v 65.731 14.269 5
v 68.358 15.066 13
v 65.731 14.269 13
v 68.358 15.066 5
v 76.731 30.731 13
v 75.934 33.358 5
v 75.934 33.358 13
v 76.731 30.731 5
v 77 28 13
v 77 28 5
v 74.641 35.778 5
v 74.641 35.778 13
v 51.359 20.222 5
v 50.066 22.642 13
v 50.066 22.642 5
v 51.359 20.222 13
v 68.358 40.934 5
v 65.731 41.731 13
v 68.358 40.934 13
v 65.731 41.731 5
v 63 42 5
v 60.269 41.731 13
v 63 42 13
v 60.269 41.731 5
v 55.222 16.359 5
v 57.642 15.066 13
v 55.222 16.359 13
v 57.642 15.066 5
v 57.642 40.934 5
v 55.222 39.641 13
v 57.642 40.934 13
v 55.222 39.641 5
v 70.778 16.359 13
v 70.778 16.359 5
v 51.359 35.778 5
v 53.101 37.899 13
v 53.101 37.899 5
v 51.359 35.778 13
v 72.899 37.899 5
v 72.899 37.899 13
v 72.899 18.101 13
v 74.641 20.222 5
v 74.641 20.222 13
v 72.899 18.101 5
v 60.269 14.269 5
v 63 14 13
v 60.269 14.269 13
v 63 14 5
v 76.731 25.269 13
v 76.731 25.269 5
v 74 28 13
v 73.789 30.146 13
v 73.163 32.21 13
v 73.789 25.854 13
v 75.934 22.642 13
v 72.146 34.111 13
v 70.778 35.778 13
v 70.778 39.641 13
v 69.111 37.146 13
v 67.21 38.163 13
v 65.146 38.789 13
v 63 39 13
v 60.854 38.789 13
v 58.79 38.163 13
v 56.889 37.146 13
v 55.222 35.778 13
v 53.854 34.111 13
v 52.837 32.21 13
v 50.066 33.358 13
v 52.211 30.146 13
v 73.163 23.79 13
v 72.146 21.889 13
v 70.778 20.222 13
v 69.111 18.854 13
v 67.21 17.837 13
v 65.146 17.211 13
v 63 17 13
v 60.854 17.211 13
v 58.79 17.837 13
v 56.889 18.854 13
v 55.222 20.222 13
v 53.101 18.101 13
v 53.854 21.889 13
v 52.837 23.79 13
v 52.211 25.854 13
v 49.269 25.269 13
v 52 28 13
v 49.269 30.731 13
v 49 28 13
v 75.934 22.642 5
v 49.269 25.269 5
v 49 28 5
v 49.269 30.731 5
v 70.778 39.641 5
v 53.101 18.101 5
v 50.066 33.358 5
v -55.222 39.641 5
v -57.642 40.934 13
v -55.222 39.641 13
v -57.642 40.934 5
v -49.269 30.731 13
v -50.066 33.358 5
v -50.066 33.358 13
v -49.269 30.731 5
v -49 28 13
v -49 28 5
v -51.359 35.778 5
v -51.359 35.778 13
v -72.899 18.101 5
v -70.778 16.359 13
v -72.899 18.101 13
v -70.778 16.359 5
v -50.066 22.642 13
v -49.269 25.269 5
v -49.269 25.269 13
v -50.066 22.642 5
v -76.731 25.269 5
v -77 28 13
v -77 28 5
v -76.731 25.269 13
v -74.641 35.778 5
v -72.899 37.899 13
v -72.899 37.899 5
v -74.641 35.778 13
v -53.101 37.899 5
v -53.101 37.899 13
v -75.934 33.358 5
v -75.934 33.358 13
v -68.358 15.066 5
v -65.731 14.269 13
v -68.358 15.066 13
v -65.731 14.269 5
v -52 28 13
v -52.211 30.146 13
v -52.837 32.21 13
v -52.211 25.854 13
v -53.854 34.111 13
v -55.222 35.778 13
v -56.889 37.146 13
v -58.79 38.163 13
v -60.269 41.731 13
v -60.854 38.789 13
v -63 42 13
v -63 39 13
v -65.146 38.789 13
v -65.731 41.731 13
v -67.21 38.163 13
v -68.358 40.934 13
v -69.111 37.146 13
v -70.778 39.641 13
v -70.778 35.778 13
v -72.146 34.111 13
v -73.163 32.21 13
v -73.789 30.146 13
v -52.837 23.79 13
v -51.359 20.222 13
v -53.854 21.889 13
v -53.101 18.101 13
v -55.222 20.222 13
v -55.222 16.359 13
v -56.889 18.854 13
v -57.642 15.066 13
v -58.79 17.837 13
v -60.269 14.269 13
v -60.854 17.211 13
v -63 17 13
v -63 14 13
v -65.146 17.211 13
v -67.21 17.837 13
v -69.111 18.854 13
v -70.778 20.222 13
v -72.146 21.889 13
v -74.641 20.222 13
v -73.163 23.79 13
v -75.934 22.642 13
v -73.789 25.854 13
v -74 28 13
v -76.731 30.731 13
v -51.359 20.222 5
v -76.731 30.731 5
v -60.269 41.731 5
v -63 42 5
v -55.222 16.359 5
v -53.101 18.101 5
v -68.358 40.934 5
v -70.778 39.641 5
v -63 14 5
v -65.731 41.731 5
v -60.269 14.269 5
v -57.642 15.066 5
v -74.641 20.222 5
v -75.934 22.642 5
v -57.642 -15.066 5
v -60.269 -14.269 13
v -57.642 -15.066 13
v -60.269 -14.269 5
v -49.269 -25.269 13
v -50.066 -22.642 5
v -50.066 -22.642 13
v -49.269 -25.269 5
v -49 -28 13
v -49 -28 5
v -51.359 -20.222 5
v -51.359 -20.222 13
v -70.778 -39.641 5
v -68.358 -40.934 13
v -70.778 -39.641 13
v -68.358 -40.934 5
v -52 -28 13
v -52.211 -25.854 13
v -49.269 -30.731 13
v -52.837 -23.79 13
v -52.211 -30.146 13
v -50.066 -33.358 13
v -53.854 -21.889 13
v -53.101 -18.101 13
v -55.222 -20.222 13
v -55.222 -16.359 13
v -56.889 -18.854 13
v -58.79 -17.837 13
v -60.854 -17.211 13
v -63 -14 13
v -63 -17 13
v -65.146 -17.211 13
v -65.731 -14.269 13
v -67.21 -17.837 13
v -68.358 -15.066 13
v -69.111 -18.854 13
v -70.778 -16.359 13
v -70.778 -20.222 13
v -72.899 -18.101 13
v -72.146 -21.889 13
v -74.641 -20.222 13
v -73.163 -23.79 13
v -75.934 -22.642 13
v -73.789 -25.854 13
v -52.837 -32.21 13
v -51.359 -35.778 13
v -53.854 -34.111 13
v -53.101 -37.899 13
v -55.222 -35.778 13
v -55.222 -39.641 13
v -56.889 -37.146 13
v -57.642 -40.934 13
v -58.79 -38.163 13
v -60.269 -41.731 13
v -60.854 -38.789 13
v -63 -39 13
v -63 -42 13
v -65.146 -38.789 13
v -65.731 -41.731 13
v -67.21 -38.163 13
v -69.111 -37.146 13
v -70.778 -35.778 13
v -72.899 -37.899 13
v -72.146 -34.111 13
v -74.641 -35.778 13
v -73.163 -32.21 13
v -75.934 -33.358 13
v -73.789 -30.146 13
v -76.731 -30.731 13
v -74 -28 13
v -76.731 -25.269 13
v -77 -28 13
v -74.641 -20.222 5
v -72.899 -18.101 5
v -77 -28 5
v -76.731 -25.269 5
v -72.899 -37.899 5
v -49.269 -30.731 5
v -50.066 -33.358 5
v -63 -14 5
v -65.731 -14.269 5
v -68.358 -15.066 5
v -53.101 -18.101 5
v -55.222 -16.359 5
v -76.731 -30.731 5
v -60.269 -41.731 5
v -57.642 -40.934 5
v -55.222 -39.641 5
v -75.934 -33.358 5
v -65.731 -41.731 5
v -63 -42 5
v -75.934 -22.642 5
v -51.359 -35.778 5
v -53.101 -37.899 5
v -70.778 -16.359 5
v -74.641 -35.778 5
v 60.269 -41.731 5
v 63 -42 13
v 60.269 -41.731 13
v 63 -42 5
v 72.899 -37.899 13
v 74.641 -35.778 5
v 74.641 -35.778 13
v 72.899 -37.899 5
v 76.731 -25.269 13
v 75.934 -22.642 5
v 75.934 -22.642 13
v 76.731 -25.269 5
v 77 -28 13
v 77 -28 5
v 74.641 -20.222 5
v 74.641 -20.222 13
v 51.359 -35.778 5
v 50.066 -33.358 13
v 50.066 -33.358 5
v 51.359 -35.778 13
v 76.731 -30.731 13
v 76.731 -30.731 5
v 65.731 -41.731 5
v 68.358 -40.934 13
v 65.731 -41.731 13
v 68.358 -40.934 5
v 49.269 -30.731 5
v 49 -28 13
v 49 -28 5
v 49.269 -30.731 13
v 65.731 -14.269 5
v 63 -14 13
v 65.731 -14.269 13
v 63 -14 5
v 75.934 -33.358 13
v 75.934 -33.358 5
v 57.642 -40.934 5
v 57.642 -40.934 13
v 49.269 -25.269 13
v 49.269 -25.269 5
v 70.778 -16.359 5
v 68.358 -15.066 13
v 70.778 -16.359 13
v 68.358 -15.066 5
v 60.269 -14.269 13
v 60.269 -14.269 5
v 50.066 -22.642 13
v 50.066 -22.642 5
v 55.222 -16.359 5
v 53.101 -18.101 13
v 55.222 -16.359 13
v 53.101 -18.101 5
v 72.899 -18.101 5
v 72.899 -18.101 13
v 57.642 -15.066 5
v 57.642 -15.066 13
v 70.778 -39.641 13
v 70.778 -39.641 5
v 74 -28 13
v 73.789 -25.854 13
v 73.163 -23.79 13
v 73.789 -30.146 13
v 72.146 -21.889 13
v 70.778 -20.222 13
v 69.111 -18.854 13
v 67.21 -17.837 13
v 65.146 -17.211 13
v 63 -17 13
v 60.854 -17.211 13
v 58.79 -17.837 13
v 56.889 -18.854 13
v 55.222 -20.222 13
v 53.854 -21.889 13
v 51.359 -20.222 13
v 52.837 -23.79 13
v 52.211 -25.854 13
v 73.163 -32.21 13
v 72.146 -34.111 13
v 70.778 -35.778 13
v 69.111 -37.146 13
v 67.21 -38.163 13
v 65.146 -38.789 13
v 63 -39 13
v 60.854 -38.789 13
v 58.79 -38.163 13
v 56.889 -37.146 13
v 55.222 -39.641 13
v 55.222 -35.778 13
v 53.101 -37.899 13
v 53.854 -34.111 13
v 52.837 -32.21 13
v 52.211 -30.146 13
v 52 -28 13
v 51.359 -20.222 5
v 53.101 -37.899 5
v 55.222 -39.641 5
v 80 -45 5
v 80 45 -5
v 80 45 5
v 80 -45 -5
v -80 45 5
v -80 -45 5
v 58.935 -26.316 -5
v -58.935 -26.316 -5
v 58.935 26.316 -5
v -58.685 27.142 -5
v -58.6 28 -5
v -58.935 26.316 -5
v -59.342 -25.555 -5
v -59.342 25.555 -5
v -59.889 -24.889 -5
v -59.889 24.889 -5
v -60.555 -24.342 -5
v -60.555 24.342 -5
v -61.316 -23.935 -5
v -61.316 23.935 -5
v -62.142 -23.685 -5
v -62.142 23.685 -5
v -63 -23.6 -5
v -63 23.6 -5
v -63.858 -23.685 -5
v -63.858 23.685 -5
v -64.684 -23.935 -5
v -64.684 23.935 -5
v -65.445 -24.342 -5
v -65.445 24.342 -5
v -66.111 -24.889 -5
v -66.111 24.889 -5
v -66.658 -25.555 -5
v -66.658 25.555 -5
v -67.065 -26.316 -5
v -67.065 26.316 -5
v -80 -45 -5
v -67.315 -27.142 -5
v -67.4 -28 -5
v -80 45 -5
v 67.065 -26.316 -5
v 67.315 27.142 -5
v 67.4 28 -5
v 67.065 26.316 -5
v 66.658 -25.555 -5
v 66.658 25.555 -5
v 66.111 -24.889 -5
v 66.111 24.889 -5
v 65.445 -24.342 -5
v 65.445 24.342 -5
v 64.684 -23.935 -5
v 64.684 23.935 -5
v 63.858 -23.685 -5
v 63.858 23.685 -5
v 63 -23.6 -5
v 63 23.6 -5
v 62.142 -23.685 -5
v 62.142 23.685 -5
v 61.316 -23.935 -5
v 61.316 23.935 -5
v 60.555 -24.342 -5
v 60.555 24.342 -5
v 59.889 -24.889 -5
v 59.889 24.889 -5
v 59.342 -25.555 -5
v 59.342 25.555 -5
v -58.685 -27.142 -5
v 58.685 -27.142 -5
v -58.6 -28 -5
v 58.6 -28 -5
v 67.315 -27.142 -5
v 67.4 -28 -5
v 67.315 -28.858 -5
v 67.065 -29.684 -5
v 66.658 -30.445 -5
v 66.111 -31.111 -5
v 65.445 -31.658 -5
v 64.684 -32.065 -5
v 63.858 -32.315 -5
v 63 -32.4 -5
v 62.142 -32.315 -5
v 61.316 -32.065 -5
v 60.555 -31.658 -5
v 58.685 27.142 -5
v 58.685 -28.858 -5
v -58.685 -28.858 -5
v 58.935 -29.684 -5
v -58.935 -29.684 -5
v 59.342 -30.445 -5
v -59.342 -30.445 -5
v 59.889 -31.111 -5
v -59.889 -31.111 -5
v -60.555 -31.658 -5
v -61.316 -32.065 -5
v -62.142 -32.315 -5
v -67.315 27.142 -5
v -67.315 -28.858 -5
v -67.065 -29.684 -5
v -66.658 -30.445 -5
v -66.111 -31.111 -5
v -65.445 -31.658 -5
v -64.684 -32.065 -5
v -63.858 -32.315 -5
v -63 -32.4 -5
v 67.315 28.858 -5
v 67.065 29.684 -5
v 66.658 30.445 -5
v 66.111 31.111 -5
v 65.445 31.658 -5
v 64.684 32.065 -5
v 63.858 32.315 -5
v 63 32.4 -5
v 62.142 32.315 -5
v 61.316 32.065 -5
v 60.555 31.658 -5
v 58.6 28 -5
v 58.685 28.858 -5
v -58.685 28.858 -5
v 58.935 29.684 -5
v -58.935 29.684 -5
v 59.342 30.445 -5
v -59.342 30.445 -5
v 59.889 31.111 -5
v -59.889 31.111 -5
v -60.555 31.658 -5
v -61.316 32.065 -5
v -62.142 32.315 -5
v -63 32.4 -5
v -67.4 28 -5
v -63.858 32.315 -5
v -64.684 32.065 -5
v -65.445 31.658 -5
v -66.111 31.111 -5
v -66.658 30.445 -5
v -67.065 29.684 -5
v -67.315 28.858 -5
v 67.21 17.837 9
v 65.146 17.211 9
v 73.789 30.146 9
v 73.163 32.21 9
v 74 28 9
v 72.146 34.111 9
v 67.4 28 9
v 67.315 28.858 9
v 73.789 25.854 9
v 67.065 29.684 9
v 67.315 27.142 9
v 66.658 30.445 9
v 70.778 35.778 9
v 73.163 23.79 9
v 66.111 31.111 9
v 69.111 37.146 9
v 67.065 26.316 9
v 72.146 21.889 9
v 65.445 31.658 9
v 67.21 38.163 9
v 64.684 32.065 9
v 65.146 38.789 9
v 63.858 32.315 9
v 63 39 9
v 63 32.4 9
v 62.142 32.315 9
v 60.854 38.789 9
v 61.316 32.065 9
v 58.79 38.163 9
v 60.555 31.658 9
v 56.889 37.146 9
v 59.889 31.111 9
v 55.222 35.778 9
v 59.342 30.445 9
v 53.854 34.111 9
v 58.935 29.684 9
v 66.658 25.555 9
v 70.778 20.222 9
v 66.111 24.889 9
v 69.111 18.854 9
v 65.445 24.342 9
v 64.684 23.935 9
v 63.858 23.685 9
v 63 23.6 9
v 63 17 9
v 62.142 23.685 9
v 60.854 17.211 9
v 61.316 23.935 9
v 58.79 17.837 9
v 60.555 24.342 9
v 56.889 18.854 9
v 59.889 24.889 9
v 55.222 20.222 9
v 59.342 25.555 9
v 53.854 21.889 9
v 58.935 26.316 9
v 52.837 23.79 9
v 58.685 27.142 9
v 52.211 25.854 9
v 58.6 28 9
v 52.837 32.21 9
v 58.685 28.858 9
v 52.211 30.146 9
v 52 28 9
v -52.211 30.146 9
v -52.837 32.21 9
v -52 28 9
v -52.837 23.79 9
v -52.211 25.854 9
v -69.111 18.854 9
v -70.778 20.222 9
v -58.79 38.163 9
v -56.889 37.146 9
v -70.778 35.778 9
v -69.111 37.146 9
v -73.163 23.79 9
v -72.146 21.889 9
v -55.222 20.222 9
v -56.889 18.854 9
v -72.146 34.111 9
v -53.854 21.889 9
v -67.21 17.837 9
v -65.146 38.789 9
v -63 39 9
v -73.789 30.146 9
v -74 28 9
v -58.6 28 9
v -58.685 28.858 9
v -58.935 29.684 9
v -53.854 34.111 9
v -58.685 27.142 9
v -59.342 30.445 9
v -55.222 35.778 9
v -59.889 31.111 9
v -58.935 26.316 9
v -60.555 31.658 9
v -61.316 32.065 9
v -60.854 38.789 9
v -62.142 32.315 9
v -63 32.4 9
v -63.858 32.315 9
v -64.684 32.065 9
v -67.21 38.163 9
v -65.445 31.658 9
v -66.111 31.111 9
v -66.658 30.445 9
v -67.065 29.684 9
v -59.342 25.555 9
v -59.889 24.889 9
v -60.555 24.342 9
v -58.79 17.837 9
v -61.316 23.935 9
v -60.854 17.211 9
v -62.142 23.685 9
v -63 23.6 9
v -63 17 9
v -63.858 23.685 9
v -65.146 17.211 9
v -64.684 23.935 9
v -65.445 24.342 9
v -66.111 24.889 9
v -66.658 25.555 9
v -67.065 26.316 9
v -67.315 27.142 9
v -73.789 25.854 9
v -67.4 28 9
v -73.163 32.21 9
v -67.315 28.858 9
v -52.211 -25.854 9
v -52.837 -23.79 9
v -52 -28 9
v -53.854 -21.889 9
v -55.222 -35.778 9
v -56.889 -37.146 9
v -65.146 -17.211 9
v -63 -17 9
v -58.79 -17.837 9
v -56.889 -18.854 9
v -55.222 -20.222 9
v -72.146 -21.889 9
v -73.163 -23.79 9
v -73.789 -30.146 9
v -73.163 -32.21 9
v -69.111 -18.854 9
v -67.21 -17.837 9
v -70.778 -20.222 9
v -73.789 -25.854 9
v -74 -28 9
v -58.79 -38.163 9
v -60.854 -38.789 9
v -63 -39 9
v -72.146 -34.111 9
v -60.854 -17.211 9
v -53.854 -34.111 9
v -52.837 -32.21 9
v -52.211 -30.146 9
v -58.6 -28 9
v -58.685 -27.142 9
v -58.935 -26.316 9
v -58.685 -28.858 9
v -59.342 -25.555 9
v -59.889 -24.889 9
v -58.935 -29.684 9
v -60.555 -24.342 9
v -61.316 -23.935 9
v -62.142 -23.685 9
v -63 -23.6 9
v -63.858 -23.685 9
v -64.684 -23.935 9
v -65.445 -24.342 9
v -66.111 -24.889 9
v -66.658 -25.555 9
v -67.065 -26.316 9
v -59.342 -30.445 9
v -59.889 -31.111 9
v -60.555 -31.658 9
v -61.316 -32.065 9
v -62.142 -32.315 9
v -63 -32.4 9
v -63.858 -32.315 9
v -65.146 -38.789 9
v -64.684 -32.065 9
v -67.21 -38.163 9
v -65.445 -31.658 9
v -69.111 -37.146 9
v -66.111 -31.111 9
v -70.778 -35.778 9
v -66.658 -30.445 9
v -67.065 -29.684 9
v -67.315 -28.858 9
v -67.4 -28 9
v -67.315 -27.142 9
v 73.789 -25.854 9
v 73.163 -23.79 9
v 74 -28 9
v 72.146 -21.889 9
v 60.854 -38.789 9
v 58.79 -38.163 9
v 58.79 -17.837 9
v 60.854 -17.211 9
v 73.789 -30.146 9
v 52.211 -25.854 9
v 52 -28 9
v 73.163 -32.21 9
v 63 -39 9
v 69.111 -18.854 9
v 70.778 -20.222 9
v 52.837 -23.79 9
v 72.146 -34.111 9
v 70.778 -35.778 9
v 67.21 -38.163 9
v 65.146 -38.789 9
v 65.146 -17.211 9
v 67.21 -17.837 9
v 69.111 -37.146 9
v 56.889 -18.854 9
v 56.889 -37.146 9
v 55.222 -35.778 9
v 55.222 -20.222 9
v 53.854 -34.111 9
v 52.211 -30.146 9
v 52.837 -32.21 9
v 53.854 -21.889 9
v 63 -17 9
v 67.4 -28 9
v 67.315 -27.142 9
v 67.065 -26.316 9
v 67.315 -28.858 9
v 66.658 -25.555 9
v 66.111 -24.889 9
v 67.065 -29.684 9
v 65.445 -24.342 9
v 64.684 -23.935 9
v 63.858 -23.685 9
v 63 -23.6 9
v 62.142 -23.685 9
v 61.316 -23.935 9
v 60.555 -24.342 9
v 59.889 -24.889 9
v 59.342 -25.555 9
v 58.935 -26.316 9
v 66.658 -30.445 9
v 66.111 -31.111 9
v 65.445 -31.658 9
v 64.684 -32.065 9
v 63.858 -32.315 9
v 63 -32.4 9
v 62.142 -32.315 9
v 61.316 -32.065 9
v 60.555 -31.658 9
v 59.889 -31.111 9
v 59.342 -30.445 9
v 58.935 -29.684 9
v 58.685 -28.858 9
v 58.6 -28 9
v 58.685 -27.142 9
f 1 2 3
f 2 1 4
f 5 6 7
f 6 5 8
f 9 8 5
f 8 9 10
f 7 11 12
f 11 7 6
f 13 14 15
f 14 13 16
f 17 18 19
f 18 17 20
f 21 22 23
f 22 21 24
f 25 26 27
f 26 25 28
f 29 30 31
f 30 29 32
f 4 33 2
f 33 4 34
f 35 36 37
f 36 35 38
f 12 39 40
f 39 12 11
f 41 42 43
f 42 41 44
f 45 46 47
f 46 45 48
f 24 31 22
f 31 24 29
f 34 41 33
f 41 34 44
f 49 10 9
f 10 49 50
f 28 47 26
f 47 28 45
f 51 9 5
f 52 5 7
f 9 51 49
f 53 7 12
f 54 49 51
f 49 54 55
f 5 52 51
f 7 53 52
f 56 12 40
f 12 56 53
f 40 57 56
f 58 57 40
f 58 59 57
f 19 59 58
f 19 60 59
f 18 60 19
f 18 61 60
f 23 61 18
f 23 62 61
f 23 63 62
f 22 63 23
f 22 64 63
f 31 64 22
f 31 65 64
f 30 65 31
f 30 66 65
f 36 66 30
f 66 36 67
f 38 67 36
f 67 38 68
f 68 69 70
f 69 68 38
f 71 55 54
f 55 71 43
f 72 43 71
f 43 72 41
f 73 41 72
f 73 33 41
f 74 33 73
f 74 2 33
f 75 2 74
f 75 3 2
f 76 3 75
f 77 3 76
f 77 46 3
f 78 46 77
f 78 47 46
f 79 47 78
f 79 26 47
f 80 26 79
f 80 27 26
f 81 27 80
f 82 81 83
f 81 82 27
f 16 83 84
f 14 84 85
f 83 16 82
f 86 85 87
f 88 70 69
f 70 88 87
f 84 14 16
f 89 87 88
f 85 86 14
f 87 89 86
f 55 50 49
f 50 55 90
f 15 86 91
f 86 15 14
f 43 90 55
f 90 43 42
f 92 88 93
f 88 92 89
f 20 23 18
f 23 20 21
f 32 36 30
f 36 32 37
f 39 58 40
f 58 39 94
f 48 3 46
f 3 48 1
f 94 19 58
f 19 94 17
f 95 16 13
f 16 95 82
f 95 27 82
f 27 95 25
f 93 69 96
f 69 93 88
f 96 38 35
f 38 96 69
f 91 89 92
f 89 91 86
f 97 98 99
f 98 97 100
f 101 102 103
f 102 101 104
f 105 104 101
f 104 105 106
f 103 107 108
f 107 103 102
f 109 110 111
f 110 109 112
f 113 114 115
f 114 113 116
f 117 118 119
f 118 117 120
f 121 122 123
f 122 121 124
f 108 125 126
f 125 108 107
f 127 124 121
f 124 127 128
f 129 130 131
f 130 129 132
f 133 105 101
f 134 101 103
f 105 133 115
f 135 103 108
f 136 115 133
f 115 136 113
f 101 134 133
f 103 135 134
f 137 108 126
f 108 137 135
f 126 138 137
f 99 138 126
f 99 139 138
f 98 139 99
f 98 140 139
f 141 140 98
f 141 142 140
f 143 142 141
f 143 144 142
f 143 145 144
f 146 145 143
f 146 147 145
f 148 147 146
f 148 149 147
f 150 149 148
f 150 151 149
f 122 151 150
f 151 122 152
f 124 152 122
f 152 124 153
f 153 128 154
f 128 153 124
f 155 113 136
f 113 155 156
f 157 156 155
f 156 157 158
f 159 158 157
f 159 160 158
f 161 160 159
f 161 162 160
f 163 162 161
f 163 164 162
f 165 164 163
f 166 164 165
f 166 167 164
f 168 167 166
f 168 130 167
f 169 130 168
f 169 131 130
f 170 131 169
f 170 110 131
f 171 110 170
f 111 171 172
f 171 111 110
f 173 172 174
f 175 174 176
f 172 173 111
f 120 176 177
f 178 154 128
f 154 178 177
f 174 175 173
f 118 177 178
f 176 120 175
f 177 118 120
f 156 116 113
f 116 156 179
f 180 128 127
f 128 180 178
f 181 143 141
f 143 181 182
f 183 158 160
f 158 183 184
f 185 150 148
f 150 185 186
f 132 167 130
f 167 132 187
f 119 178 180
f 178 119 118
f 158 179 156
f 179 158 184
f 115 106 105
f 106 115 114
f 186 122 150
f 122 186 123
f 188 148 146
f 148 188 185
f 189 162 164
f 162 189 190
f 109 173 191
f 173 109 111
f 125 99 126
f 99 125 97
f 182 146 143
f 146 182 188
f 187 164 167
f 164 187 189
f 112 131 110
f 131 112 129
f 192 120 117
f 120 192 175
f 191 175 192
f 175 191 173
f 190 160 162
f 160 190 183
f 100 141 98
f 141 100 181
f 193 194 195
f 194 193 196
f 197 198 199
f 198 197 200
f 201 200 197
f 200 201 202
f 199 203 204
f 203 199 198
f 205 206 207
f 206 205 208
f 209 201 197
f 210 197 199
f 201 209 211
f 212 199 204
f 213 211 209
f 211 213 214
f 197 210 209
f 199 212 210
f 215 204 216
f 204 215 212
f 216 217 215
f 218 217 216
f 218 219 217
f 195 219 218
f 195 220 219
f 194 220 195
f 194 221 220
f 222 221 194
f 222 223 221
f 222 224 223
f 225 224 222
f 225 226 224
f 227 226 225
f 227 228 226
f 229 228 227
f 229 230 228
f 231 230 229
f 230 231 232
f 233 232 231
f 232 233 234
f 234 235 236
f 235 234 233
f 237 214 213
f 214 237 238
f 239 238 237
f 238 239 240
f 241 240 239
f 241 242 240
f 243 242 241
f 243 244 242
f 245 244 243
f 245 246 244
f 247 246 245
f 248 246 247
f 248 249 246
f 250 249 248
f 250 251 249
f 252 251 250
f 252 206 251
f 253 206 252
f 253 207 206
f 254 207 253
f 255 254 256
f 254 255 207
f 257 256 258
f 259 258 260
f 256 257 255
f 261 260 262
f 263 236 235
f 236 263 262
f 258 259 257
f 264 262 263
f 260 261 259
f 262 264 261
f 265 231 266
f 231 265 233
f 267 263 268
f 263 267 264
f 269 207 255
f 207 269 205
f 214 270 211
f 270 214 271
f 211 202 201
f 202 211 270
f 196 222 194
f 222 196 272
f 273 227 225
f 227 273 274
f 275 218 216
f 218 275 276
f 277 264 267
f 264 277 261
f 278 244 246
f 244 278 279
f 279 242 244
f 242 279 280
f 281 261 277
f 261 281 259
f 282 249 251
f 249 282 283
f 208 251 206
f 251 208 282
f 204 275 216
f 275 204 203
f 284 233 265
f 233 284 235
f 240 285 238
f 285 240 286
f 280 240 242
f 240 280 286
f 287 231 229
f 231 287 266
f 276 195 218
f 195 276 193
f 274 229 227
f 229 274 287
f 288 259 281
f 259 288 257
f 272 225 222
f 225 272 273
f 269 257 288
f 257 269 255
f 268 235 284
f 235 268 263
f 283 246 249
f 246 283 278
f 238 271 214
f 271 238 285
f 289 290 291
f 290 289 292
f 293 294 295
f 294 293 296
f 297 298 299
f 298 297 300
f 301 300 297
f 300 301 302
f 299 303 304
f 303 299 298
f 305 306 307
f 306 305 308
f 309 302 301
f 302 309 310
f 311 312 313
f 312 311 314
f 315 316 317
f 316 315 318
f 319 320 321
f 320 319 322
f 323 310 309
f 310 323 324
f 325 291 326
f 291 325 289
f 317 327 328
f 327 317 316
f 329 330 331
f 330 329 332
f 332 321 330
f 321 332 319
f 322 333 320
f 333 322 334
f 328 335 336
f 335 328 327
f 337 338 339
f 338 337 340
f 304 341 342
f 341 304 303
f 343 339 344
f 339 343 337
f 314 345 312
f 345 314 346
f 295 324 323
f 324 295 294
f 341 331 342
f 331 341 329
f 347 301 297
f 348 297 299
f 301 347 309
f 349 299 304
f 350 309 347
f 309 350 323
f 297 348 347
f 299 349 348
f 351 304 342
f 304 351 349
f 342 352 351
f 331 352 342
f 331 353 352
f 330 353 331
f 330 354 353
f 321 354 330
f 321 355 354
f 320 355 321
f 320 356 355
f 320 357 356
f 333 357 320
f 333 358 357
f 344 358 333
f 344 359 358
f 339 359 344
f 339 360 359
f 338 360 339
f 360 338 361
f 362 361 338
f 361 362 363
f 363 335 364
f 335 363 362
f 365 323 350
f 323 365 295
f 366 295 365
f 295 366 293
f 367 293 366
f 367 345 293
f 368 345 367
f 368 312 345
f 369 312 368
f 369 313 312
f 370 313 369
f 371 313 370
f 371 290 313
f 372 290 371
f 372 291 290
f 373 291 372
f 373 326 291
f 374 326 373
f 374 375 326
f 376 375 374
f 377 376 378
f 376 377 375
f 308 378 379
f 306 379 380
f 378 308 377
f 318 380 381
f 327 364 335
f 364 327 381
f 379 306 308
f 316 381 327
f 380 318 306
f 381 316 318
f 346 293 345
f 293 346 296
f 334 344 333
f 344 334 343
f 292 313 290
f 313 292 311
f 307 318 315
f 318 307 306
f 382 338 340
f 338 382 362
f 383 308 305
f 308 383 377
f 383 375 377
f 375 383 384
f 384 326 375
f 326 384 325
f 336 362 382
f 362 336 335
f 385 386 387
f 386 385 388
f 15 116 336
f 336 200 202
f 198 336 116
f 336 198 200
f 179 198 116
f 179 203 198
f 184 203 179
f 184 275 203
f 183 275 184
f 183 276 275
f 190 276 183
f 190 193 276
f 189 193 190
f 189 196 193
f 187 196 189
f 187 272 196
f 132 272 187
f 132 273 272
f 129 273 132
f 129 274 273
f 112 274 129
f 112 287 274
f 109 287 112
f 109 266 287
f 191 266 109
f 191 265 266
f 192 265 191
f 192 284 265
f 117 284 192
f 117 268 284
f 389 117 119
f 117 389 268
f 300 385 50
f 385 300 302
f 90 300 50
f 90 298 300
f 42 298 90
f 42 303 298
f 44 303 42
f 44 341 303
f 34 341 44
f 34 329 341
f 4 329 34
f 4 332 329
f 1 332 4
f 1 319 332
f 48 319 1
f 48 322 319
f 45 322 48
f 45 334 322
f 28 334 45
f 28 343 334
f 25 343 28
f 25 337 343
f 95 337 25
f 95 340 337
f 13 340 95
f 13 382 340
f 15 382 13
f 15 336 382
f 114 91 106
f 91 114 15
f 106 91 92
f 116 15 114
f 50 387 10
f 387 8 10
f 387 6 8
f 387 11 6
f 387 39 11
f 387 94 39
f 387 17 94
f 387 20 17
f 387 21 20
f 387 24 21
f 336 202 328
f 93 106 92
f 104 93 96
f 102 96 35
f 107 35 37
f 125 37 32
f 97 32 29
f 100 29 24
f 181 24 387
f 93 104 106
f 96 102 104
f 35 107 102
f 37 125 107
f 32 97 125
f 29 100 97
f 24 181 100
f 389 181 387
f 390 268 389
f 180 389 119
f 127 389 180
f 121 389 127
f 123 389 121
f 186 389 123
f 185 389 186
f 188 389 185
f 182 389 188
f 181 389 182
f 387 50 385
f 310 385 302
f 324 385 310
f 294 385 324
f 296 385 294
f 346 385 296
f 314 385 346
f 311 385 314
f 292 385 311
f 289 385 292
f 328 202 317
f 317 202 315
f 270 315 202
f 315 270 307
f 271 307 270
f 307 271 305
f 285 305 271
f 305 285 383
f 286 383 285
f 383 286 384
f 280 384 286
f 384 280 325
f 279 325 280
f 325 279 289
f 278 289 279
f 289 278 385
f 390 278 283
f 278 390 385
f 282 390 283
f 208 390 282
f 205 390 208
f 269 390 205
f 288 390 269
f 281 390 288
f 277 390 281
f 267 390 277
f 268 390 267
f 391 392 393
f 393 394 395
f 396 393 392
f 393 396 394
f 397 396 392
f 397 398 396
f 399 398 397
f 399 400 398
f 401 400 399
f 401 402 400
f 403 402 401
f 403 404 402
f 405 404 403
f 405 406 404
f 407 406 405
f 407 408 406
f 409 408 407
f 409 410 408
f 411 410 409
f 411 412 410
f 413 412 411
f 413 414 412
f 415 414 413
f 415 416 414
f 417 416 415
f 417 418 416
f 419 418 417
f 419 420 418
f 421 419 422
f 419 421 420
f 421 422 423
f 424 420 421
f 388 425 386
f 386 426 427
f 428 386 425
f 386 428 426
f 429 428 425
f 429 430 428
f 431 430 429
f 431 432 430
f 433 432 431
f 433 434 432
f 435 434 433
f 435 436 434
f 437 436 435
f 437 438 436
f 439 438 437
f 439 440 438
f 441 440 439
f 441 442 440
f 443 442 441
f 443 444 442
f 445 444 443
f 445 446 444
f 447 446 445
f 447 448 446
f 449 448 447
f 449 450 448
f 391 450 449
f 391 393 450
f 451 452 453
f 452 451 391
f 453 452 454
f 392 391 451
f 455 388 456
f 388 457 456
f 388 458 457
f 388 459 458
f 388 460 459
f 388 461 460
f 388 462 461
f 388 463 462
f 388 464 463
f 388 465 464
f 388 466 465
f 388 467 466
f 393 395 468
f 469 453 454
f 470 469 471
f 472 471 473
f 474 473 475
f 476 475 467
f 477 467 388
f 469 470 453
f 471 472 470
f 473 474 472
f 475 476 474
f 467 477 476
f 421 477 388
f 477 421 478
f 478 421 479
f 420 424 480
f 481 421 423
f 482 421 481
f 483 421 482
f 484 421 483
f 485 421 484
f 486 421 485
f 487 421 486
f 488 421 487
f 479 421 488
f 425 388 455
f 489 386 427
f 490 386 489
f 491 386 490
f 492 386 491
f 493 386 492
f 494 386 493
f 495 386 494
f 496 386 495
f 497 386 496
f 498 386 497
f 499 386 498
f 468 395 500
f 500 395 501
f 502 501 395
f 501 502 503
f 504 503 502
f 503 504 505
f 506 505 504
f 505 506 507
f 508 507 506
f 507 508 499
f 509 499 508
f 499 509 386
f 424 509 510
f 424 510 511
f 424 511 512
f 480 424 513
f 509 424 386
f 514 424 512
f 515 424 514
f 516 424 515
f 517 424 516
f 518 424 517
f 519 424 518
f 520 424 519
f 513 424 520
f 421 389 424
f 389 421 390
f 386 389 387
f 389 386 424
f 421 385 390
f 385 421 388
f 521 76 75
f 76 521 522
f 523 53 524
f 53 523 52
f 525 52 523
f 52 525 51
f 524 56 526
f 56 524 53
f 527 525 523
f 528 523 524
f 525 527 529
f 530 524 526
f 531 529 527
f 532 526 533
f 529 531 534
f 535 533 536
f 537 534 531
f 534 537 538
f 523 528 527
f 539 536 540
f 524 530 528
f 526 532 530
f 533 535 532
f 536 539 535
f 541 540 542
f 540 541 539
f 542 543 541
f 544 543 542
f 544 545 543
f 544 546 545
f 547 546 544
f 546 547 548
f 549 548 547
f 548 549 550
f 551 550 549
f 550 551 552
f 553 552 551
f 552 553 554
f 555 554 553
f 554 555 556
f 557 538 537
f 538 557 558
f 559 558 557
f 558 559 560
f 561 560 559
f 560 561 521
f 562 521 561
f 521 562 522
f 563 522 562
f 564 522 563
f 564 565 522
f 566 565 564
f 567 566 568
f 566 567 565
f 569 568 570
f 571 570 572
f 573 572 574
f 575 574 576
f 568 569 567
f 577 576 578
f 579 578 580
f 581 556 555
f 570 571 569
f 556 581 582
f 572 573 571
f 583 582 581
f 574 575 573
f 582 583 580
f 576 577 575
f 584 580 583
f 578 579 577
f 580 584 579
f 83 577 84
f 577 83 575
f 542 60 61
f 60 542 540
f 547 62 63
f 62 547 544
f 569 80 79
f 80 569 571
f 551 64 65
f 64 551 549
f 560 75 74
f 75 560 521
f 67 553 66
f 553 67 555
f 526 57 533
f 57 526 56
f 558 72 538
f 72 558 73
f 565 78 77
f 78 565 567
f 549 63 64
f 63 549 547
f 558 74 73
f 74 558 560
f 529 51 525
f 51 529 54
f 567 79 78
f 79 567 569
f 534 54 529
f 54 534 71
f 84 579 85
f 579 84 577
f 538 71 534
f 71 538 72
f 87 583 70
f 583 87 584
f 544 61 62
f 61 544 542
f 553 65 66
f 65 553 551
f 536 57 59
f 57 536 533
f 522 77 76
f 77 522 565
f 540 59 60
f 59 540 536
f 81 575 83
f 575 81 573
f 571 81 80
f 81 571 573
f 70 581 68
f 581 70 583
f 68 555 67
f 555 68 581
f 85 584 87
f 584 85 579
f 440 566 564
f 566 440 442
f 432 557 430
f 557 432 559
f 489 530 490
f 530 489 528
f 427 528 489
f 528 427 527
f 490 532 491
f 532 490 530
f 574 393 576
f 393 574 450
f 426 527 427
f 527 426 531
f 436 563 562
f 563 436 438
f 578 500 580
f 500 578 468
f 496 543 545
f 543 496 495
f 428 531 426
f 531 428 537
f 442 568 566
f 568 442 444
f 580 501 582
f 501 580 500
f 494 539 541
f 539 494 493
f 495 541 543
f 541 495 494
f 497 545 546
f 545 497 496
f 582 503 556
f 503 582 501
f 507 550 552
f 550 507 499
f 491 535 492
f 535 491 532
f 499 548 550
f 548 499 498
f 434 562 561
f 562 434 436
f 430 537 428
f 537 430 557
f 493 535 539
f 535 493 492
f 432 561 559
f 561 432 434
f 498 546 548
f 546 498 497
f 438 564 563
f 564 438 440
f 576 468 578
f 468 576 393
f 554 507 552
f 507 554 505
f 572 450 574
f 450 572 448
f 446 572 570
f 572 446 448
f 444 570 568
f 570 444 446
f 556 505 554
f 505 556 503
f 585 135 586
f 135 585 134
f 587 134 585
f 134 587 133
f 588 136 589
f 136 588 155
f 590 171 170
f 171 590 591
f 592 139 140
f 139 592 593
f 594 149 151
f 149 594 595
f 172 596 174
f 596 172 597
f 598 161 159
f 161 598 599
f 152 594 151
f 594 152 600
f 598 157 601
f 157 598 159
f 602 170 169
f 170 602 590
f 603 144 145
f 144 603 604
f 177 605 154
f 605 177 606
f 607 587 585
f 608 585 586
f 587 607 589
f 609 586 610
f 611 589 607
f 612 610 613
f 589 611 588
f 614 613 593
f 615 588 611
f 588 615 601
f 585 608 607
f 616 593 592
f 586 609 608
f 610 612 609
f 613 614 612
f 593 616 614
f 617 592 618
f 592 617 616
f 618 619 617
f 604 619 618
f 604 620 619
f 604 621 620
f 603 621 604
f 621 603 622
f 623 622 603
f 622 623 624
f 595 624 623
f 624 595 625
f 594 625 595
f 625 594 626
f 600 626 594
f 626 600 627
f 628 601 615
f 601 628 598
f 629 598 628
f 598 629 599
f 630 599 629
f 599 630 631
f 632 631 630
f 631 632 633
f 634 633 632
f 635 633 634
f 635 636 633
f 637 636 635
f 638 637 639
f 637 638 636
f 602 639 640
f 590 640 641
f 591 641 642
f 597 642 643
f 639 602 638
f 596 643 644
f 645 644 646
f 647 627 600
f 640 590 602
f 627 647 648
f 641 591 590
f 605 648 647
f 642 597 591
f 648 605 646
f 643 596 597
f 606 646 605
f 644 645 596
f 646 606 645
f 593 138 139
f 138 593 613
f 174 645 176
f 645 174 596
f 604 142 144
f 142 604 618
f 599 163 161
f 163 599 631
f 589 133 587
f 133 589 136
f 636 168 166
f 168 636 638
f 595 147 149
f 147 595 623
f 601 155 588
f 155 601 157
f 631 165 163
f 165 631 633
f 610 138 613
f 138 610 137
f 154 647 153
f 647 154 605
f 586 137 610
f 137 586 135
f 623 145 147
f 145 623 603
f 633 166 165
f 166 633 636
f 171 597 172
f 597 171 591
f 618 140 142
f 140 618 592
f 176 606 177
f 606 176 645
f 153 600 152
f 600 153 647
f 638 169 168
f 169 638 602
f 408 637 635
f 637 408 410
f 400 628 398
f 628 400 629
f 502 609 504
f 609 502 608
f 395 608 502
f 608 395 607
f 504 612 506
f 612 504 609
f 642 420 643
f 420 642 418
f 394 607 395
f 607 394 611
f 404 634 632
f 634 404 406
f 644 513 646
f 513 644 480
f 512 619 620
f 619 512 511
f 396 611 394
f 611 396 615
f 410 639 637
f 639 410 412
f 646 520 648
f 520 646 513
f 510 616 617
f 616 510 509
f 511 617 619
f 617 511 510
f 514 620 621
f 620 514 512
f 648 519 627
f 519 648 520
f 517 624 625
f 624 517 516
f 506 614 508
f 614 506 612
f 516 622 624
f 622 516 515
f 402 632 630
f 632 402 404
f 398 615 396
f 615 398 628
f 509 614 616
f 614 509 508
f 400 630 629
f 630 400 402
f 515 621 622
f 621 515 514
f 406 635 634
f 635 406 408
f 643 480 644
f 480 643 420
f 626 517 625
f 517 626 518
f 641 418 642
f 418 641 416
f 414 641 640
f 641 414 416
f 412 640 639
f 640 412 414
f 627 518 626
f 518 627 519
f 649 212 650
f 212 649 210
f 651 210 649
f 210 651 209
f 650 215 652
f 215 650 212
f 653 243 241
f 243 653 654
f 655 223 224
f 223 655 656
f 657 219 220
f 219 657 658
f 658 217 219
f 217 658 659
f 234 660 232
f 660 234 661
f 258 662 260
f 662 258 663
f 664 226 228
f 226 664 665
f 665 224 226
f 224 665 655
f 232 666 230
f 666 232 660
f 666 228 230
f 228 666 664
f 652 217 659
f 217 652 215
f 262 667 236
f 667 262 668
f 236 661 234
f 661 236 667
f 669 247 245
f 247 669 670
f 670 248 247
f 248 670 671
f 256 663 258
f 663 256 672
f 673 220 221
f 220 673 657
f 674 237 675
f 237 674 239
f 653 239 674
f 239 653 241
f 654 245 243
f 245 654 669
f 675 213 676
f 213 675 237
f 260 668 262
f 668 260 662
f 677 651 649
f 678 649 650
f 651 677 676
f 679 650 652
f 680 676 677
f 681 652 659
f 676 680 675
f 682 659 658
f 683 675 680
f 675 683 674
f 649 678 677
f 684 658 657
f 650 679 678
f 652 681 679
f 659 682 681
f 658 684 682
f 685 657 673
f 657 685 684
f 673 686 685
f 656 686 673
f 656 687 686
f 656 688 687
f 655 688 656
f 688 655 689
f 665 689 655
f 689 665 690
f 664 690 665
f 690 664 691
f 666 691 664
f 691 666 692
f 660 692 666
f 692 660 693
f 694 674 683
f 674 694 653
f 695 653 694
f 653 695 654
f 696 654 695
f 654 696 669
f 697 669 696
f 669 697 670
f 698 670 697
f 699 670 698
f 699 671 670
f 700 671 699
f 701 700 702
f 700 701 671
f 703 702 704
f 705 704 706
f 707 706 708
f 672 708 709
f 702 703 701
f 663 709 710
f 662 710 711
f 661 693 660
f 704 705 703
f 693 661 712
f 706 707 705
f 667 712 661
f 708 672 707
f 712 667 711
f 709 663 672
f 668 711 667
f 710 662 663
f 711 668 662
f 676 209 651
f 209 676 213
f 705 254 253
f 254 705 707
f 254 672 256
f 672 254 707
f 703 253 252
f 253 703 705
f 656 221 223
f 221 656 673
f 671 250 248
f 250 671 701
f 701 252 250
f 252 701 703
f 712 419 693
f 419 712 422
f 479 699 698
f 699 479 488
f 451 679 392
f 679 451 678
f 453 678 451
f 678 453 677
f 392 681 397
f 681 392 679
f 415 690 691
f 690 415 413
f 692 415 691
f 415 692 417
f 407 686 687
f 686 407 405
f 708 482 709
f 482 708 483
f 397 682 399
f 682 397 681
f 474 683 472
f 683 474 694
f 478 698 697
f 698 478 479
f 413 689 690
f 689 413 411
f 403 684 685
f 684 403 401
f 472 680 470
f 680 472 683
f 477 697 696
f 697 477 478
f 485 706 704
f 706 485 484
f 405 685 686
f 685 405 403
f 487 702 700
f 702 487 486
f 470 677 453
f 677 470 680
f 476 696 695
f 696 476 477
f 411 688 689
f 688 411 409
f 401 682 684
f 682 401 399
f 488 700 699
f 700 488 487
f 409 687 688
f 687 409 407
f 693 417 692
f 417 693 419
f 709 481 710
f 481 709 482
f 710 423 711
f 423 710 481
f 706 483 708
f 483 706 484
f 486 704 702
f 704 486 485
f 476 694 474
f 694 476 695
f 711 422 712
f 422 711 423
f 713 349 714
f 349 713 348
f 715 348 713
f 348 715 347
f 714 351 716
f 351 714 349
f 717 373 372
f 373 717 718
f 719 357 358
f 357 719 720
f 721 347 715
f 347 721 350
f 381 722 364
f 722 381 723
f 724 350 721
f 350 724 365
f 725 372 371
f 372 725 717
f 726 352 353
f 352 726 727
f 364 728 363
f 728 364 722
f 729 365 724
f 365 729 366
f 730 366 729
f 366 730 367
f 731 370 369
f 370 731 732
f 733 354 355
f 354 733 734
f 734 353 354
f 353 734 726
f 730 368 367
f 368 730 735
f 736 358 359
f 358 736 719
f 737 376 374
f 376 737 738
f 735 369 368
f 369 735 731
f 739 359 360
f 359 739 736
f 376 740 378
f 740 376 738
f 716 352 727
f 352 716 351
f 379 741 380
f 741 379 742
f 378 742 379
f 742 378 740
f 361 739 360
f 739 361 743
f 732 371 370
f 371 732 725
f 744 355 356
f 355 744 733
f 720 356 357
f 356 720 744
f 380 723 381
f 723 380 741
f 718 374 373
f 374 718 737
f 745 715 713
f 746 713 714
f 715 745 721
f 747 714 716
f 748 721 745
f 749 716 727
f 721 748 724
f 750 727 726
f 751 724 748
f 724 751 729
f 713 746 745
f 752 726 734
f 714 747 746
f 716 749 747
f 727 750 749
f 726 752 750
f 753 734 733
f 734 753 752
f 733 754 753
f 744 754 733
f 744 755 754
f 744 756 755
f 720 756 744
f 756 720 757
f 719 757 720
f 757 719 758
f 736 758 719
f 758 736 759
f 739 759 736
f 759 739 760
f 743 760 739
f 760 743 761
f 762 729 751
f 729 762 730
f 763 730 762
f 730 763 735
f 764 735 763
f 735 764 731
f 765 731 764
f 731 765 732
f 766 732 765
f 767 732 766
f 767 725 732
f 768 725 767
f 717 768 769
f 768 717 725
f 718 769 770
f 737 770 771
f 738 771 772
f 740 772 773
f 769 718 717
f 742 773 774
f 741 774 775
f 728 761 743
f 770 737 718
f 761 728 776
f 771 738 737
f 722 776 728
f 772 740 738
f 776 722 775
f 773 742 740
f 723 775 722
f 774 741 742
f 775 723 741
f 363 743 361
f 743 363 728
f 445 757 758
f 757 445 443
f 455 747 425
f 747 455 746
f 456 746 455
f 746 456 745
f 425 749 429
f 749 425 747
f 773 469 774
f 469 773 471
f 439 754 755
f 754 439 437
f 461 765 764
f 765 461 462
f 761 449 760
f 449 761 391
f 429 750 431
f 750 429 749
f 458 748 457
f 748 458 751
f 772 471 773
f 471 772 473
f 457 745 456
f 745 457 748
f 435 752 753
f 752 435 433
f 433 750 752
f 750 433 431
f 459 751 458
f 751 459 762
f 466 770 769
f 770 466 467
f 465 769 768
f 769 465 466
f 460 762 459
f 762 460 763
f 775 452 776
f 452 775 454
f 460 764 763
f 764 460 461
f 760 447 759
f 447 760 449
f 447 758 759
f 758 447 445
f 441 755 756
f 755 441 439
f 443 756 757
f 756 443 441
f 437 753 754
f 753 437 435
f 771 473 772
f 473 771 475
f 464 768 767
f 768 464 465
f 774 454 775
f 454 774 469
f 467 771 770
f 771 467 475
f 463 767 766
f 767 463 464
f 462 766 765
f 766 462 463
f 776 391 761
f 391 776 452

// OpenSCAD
$fn = 32;

// ----------------------------------------------------------------------
// Socket pad plate
// bosses with counterbored sockets for the screws
// ----------------------------------------------------------------------

// --- parameters (mm) ---
base_t = 10;            // base plate thickness
boss_h = 8;             // boss height above the base plate
boss_d = 28;            // boss diameter
socket_d = 22;          // socket diameter
socket_depth = 4;       // socket depth from the boss face
bolt_d = 8.8;           // screw clearance hole through the socket floor
plate = [160, 90, 10];  // overall size (x, y, z)
edge = 17;              // boss centre offset from the plate edge
pads = 4;               // boss count, one per corner

// --- derived feature positions (mm) ---
height = base_t + boss_h;        // = 18   overall height of the part
corner_x = plate[0] / 2 - edge;  // = 63   boss centre X
corner_y = plate[1] / 2 - edge;  // = 28   boss centre Y
feature_centers = [
  [corner_x, corner_y],
  [-corner_x, corner_y],
  [-corner_x, -corner_y],
  [corner_x, -corner_y]
];   // boss centres: sockets, holes and the pads themselves are placed from here

// base plate, bosses on feature_centers, socket + through hole in each
difference() {
  union() {
    cube(plate, center = true);
    for (centre = feature_centers)
      translate([centre[0], centre[1], plate[2] / 2 - 1])
        cylinder(d = boss_d, h = boss_h + 1);
  }
  for (centre = feature_centers) {
    translate([centre[0], centre[1], plate[2] / 2 + boss_h - socket_depth])
      cylinder(d = socket_d, h = socket_depth + 1);
    translate([centre[0], centre[1], -height])
      cylinder(d = bolt_d, h = 2 * height + 2);  // through the socket floor
  }
}
